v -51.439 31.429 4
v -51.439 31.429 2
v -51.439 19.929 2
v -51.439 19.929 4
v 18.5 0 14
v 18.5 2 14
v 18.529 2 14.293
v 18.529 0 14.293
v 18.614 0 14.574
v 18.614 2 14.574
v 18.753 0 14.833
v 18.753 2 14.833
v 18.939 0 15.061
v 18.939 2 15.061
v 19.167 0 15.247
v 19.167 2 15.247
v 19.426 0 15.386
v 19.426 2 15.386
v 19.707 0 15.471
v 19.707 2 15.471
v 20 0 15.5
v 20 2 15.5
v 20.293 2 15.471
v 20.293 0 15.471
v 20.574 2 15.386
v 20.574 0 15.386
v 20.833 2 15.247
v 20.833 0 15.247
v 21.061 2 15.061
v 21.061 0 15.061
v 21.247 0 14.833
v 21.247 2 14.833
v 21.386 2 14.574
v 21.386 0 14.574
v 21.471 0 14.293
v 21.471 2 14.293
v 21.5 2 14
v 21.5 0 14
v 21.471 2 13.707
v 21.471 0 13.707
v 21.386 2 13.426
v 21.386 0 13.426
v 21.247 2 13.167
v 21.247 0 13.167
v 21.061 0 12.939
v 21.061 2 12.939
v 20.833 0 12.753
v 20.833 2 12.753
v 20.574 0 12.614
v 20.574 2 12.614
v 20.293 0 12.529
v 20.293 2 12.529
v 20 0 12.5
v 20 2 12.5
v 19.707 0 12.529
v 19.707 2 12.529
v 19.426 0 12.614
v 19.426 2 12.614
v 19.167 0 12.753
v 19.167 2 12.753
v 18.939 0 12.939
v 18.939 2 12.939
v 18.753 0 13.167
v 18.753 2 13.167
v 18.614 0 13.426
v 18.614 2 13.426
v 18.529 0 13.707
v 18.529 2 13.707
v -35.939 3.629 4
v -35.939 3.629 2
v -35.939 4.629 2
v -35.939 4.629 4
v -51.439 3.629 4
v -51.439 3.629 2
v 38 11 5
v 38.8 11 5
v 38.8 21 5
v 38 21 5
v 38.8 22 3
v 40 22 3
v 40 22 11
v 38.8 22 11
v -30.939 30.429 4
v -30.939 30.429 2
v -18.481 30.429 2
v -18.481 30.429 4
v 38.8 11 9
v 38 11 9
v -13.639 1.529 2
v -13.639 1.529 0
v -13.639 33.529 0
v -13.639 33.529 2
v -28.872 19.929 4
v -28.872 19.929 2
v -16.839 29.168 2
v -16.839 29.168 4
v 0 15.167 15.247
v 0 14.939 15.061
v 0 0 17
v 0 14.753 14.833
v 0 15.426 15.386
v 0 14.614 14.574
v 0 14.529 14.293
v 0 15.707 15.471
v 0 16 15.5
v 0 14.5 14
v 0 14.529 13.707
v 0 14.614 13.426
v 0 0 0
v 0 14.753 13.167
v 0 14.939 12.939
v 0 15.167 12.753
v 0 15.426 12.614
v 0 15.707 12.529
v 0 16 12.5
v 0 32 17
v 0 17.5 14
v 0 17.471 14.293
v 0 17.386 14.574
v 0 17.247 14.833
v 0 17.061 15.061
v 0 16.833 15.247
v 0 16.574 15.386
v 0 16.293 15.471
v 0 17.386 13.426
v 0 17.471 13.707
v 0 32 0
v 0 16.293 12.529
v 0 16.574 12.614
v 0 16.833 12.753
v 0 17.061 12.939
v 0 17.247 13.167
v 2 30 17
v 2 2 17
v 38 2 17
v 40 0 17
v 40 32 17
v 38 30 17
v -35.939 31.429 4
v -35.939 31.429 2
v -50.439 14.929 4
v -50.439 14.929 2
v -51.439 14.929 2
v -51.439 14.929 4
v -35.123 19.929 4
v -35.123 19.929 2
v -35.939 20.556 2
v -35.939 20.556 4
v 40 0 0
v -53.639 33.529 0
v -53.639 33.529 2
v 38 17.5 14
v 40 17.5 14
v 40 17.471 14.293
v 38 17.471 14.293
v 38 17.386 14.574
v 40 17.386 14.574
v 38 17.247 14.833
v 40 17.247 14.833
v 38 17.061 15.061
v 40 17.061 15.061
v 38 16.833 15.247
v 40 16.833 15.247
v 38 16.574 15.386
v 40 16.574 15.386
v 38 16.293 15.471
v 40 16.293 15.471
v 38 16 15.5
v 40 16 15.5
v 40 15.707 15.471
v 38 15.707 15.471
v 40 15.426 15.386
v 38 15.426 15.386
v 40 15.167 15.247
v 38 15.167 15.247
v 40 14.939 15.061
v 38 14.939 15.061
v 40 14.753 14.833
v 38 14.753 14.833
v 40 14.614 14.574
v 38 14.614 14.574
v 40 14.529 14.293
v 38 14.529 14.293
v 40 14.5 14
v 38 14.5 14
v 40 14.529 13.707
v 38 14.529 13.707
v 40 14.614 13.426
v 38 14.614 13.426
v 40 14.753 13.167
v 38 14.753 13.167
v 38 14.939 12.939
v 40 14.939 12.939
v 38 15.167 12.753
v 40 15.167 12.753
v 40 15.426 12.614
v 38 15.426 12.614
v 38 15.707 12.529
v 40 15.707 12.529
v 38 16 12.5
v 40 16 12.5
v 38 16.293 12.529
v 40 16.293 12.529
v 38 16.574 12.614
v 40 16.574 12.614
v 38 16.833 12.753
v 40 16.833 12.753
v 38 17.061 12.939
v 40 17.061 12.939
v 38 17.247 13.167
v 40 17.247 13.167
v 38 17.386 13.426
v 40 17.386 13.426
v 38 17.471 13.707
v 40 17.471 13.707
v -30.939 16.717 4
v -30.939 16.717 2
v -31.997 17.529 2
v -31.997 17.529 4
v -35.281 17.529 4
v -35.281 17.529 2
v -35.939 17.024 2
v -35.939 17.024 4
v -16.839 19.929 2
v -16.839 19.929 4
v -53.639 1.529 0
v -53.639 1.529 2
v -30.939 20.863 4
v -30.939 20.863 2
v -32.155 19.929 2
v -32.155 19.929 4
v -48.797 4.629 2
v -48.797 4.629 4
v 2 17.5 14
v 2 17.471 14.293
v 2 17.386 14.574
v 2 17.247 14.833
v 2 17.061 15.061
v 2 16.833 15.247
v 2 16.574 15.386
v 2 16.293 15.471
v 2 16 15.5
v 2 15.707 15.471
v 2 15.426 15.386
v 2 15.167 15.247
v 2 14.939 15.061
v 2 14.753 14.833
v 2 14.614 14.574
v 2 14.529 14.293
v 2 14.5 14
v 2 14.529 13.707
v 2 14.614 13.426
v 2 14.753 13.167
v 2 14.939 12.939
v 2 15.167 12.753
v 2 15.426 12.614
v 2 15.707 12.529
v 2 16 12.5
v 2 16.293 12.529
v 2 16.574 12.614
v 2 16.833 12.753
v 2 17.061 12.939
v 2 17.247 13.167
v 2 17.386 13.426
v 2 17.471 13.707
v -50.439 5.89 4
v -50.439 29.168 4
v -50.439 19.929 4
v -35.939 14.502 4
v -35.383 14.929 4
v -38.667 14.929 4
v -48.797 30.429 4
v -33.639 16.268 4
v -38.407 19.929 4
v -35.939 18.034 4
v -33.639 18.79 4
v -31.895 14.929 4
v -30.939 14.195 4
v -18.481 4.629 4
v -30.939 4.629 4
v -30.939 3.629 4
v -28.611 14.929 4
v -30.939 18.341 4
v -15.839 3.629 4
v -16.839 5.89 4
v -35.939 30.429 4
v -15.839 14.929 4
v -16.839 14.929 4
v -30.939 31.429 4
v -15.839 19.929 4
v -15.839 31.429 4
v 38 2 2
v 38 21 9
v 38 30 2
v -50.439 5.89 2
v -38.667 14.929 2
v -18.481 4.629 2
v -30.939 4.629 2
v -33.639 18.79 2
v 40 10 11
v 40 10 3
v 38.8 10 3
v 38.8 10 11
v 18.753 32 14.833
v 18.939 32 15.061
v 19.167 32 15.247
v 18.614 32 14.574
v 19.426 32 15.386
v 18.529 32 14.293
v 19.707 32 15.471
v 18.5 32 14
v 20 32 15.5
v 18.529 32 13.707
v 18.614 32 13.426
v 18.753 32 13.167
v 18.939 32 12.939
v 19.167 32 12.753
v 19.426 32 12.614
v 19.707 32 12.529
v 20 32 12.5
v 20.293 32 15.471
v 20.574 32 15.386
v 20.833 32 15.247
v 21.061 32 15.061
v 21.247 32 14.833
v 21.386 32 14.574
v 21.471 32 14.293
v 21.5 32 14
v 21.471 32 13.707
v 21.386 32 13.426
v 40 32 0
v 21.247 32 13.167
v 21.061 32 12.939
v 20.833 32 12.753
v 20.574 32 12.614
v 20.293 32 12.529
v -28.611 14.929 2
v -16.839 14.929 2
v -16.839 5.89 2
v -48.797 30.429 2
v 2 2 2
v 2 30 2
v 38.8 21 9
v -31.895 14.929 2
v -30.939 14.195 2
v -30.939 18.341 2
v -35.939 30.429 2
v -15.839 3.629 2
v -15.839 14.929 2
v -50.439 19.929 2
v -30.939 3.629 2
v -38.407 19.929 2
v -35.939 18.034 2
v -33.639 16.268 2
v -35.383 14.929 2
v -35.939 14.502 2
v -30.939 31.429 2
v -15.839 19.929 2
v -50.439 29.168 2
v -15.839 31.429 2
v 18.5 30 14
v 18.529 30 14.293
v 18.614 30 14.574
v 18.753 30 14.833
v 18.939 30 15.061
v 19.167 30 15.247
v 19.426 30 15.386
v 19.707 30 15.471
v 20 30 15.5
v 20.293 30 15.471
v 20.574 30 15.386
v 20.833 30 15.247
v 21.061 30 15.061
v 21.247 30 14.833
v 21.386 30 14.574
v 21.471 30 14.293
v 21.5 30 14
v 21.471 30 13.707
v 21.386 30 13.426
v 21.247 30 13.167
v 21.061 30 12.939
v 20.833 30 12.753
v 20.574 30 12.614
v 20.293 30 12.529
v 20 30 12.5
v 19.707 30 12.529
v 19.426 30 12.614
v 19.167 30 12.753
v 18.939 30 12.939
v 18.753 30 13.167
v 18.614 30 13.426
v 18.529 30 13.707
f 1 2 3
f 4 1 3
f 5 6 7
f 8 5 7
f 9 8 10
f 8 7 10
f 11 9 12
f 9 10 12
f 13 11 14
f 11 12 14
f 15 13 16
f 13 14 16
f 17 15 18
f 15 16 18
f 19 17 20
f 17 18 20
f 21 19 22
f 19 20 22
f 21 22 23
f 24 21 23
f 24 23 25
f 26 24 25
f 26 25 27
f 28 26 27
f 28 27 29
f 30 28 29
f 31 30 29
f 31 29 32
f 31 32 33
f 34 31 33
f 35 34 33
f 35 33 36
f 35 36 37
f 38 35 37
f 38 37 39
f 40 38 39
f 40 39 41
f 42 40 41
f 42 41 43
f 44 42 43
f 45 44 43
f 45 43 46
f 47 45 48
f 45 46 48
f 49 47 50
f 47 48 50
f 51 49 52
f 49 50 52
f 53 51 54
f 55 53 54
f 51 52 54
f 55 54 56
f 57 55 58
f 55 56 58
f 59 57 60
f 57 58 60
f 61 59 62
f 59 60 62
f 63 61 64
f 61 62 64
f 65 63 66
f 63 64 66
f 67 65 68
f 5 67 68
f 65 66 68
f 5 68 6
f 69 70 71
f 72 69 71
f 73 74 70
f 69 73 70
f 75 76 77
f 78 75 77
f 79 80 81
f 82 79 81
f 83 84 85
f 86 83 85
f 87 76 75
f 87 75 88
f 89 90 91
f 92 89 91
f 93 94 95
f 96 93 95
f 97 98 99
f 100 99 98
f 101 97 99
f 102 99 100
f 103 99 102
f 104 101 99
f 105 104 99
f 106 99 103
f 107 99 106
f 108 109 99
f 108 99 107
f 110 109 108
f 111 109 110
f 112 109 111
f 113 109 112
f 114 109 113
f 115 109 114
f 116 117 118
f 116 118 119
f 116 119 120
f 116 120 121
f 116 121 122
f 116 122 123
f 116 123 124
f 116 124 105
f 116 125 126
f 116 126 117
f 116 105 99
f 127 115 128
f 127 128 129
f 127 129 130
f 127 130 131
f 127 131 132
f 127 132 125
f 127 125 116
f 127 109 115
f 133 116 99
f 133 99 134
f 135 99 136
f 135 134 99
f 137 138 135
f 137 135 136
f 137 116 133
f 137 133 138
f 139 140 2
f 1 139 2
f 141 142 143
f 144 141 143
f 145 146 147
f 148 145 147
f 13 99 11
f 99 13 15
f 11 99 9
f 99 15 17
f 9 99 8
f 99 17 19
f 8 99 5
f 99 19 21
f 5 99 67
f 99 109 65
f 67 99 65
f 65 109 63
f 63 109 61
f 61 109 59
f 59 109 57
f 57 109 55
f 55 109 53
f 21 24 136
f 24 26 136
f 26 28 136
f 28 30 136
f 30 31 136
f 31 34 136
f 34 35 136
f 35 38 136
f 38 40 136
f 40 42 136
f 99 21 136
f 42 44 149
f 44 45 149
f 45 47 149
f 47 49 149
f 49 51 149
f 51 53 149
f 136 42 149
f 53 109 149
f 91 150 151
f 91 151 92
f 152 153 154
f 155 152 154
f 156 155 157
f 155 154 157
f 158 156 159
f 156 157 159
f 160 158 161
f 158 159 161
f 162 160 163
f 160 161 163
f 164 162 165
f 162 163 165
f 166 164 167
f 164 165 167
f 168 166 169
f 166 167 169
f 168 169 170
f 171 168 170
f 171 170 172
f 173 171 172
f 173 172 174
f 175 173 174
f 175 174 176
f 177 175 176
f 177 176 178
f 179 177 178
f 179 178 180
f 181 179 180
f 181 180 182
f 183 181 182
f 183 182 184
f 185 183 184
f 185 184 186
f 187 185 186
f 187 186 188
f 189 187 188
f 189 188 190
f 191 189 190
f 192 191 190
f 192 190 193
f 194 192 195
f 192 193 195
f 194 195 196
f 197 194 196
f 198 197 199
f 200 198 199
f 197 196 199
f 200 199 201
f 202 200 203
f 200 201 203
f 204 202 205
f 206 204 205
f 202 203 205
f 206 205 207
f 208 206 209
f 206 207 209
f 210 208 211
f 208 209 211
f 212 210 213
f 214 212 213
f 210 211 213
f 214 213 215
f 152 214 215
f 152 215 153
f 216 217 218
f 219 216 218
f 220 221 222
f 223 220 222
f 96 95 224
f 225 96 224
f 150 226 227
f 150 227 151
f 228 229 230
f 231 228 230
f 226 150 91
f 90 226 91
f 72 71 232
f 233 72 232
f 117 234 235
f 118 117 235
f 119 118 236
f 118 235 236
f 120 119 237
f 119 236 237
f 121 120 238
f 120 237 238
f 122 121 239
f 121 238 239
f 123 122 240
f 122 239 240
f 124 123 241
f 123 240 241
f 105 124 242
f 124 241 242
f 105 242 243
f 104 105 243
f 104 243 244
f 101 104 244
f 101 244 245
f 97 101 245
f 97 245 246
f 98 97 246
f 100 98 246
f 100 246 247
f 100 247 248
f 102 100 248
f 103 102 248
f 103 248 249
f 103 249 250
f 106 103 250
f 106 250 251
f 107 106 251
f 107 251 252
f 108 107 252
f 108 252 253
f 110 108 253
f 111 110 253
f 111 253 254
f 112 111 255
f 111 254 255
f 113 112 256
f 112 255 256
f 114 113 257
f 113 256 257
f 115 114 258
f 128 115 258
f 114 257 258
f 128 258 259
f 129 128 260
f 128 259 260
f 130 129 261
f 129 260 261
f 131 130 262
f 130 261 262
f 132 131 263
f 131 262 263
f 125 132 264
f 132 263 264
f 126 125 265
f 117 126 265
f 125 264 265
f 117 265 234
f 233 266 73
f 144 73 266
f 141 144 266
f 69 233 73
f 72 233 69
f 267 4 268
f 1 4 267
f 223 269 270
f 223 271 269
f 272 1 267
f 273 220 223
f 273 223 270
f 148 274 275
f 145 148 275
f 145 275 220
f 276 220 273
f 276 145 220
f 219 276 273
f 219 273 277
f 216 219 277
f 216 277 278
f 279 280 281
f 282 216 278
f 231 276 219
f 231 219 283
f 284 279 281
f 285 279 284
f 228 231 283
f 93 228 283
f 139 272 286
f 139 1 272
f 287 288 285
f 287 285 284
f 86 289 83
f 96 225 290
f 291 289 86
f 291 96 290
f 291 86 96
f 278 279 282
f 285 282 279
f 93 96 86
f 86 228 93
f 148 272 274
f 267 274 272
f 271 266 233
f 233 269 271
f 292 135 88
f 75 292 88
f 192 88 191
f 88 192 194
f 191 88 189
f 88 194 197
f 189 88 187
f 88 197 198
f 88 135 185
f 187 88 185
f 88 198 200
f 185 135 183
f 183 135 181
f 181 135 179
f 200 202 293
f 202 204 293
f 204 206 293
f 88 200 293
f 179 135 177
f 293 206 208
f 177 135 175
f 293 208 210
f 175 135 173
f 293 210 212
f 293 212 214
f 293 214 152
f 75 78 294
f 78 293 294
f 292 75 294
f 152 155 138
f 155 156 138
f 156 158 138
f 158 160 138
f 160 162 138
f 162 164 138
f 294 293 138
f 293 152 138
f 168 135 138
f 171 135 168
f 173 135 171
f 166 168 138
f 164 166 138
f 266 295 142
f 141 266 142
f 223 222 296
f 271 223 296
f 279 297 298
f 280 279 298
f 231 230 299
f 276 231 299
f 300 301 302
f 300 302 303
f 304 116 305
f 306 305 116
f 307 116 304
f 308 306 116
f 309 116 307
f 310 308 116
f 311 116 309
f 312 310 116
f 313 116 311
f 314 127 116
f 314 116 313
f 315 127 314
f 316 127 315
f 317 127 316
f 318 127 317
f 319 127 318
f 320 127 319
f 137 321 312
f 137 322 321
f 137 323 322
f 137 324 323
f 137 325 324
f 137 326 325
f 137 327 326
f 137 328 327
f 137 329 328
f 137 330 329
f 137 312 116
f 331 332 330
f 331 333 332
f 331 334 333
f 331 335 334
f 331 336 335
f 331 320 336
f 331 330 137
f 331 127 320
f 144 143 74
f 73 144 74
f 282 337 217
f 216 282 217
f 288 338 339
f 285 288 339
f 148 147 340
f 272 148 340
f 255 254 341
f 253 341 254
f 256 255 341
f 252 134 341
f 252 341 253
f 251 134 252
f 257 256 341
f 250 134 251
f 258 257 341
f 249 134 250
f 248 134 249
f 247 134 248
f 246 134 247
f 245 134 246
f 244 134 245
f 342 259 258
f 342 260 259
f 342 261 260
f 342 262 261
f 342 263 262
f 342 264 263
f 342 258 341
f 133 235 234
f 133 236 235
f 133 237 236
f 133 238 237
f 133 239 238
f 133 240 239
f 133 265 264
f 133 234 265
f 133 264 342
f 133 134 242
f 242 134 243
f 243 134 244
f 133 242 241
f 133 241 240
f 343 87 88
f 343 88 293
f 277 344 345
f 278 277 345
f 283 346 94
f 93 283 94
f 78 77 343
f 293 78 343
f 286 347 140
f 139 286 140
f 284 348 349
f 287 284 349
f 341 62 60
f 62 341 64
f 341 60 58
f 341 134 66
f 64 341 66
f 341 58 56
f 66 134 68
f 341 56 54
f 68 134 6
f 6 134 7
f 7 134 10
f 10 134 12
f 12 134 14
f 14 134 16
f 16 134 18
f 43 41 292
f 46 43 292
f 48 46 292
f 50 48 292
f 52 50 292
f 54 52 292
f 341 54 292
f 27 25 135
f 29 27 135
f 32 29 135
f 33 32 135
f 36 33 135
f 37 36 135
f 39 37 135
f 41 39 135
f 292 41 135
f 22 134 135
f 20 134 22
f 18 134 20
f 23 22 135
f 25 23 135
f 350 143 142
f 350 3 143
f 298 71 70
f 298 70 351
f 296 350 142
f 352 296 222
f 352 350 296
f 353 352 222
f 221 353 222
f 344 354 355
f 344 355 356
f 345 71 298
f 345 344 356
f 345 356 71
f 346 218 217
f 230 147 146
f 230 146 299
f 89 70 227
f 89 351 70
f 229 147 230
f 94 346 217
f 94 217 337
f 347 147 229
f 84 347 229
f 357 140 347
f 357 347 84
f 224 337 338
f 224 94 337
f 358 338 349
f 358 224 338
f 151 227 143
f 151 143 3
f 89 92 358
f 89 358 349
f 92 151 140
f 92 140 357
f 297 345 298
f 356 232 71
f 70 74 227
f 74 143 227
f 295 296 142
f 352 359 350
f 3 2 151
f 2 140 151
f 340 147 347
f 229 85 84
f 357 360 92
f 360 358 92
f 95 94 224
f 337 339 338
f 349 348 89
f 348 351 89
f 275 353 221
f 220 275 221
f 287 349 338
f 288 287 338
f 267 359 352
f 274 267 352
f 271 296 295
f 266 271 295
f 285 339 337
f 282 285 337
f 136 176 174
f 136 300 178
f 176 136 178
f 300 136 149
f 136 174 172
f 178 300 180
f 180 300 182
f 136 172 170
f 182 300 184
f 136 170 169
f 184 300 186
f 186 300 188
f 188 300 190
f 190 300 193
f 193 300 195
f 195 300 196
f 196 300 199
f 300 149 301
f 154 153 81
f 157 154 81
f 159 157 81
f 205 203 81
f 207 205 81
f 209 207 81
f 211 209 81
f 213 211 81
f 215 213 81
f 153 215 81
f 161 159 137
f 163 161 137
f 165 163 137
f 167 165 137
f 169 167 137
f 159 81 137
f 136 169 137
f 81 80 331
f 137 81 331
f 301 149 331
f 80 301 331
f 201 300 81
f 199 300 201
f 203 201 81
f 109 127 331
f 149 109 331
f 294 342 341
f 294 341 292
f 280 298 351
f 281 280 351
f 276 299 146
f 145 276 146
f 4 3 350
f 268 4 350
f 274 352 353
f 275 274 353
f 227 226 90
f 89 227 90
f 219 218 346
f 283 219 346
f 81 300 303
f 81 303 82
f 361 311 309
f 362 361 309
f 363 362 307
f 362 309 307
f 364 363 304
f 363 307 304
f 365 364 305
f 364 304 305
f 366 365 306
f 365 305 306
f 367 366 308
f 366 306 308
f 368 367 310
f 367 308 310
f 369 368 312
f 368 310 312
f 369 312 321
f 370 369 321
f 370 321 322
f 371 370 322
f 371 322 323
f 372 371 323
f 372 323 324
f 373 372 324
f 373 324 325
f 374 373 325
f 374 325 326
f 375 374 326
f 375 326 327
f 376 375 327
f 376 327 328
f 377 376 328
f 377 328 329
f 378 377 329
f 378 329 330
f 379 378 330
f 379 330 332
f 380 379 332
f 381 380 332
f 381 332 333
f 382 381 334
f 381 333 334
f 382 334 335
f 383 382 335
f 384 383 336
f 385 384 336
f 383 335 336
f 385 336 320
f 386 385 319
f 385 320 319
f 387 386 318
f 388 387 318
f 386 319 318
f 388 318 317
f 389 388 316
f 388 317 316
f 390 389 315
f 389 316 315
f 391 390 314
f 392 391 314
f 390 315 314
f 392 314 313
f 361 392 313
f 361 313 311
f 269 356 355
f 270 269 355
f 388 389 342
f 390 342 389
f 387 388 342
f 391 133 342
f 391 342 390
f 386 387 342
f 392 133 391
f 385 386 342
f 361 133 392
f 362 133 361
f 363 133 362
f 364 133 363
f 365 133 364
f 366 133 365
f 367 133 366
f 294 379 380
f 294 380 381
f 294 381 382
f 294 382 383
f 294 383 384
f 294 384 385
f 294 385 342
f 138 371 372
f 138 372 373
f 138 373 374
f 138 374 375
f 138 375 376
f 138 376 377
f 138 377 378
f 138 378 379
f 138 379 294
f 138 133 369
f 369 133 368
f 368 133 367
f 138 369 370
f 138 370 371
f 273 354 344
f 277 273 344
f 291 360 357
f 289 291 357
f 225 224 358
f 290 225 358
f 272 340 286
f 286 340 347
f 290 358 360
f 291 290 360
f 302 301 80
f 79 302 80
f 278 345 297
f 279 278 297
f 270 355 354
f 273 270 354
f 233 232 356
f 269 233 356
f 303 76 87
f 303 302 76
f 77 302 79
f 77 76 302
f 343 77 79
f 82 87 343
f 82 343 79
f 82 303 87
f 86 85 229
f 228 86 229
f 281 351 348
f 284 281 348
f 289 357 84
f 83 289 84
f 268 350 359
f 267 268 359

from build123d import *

# Parameters (mm, degrees)
F0_W      = 40
F0_H      = 32
F1_DEPTH  = 17
F2_W      = 36
F2_H      = 28
F3_DEPTH  = 15
F4_R      = 1.5
F5_DEPTH  = 40.001
F6_R      = 1.5
F7_DEPTH  = 32.001
F4_W      = 10
F4_H      = 4
F8_DEPTH  = 2
F9_W      = 40
F9_H      = 32
F10_DEPTH = 2
F12_DEPTH = 2
F4_W_2    = 12
F4_H_2    = 8
F13_DEPTH = 1.2


with BuildPart() as f1:
    # F0 (on Top) → F1 (new body)
    with BuildSketch(Plane.XY):
        with Locations((20, 16)):
            Rectangle(F0_W, F0_H)
    extrude(amount=F1_DEPTH)

    # F2 (on face) → F3 (cut)
    with BuildSketch(Plane.XY.offset(17)):
        with Locations((20, 16)):
            Rectangle(F2_W, F2_H)
    extrude(amount=-F3_DEPTH, mode=Mode.SUBTRACT)

    # F4 (on face) → F5 (cut, through all)
    with BuildSketch(Plane.YZ.offset(40)):
        with Locations((16, 14)):
            Circle(F4_R)
    extrude(amount=-F5_DEPTH, mode=Mode.SUBTRACT)

    # F6 (on face) → F7 (cut, through all)
    with BuildSketch(Plane(origin=(0, 32, 0), x_dir=(-1, 0, 0), z_dir=(0, 1, 0))):
        with Locations((-20, 14)):
            Circle(F6_R)
    extrude(amount=-F7_DEPTH, mode=Mode.SUBTRACT)

    # F4 (on face) → F8 (cut, through all)
    with BuildSketch(Plane.YZ.offset(40)):
        with Locations((16, 7)):
            Rectangle(F4_W, F4_H)
    extrude(amount=-F8_DEPTH, mode=Mode.SUBTRACT)

    # F4 (on face) → F13 (cut)
    with BuildSketch(Plane.YZ.offset(40)):
        with Locations((16, 7)):
            Rectangle(F4_W_2, F4_H_2)
        with Locations((16, 7)):
            Rectangle(F4_W, F4_H, mode=Mode.SUBTRACT)
    extrude(amount=-F13_DEPTH, mode=Mode.SUBTRACT)


with BuildPart() as f10:
    # F9 (on Top) → F10 (new body)
    with BuildSketch(Plane.XY):
        with Locations((-33.6390890081, 17.5289876275)):
            Rectangle(F9_W, F9_H)
    extrude(amount=F10_DEPTH)

    # F11 (on face) → F12 (join)
    with BuildSketch(Plane.XY.offset(2)):
        Polygon((-35.9390890081, 31.4289876275), (-51.4390890081, 31.4289876275), (-51.4390890081, 19.9289876275), (-50.4390890081, 19.9289876275), (-50.4390890081, 29.1681924055), (-50.4390890081, 30.4289876275), (-48.7971231376, 30.4289876275), (-35.9390890081, 30.4289876275), align=None)
        Polygon((-15.8390890081, 31.4289876275), (-30.9390890081, 31.4289876275), (-30.9390890081, 30.4289876275), (-18.4810548786, 30.4289876275), (-16.8390890081, 30.4289876275), (-16.8390890081, 29.1681924055), (-16.8390890081, 19.9289876275), (-15.8390890081, 19.9289876275), align=None)
        Polygon((-50.4390890081, 30.4289876275), (-50.4390890081, 29.1681924055), (-38.406636274, 19.9289876275), (-36.7646704035, 19.9289876275), align=None)
        Polygon((-35.9390890081, 20.5558542781), (-48.7971231376, 30.4289876275), (-50.4390890081, 30.4289876275), (-36.7646704035, 19.9289876275), (-35.9390890081, 19.9289876275), align=None)
        Polygon((-32.8181060728, 18.1593852385), (-33.6390890081, 18.7897828495), (-34.4600719434, 18.1593852385), (-33.6390890081, 17.5289876275), align=None)
        Polygon((-31.9971231376, 17.5289876275), (-32.8181060728, 18.1593852385), (-33.6390890081, 17.5289876275), (-32.8181060728, 16.8985900165), align=None)
        Polygon((-34.4600719434, 18.1593852385), (-35.2810548786, 17.5289876275), (-34.4600719434, 16.8985900165), (-33.6390890081, 17.5289876275), align=None)
        Polygon((-33.6390890081, 17.5289876275), (-34.4600719434, 16.8985900165), (-33.6390890081, 16.2681924055), (-32.8181060728, 16.8985900165), align=None)
        Polygon((-30.9390890081, 18.3414066912), (-30.9390890081, 19.6022019132), (-32.8181060728, 18.1593852385), (-31.9971231376, 17.5289876275), align=None)
        Polygon((-30.9390890081, 19.9289876275), (-32.1554734833, 19.9289876275), (-33.6390890081, 18.7897828495), (-32.8181060728, 18.1593852385), (-30.9390890081, 19.6022019132), align=None)
        Polygon((-35.2810548786, 17.5289876275), (-35.9390890081, 17.0237114209), (-35.9390890081, 15.7629161989), (-34.4600719434, 16.8985900165), align=None)
        Polygon((-34.4600719434, 16.8985900165), (-35.9390890081, 15.7629161989), (-35.9390890081, 14.9289876275), (-35.3831696492, 14.9289876275), (-33.6390890081, 16.2681924055), align=None)
        Polygon((-30.9390890081, 14.1949781198), (-18.4810548786, 4.6289876275), (-16.8390890081, 4.6289876275), (-30.2530424965, 14.9289876275), (-30.9390890081, 14.9289876275), align=None)
        Polygon((-16.8390890081, 4.6289876275), (-16.8390890081, 5.8897828495), (-28.611076626, 14.9289876275), (-30.2530424965, 14.9289876275), align=None)
        Polygon((-35.9390890081, 17.0237114209), (-38.6671013903, 14.9289876275), (-37.0251355197, 14.9289876275), (-35.9390890081, 15.7629161989), align=None)
        Polygon((-36.7646704035, 19.9289876275), (-38.406636274, 19.9289876275), (-35.9390890081, 18.034263834), (-35.9390890081, 19.295059056), align=None)
        Polygon((-35.9390890081, 19.295059056), (-35.9390890081, 18.034263834), (-35.2810548786, 17.5289876275), (-34.4600719434, 18.1593852385), align=None)
        Polygon((-33.6390890081, 18.7897828495), (-35.1227045329, 19.9289876275), (-35.9390890081, 19.9289876275), (-35.9390890081, 19.295059056), (-34.4600719434, 18.1593852385), align=None)
        Polygon((-35.1227045329, 19.9289876275), (-35.9390890081, 20.5558542781), (-35.9390890081, 19.9289876275), align=None)
        Polygon((-35.9390890081, 15.7629161989), (-37.0251355197, 14.9289876275), (-35.9390890081, 14.9289876275), align=None)
        Polygon((-32.8181060728, 16.8985900165), (-33.6390890081, 16.2681924055), (-31.895008367, 14.9289876275), (-30.9390890081, 14.9289876275), (-30.9390890081, 15.4557733418), align=None)
        Polygon((-30.9390890081, 16.7165685638), (-31.9971231376, 17.5289876275), (-32.8181060728, 16.8985900165), (-30.9390890081, 15.4557733418), align=None)
        Polygon((-30.2530424965, 14.9289876275), (-28.611076626, 14.9289876275), (-30.9390890081, 16.7165685638), (-30.9390890081, 15.4557733418), align=None)
        Polygon((-30.9390890081, 14.9289876275), (-30.2530424965, 14.9289876275), (-30.9390890081, 15.4557733418), align=None)
        Polygon((-31.895008367, 14.9289876275), (-30.9390890081, 14.1949781198), (-30.9390890081, 14.9289876275), align=None)
        Polygon((-35.9390890081, 19.295059056), (-35.9390890081, 19.9289876275), (-36.7646704035, 19.9289876275), align=None)
        Polygon((-30.9390890081, 18.3414066912), (-28.8715417422, 19.9289876275), (-30.5135076128, 19.9289876275), (-30.9390890081, 19.6022019132), align=None)
        Polygon((-30.5135076128, 19.9289876275), (-30.9390890081, 19.9289876275), (-30.9390890081, 19.6022019132), align=None)
        Polygon((-30.9390890081, 19.9289876275), (-30.9390890081, 20.8629971352), (-32.1554734833, 19.9289876275), align=None)
        Polygon((-16.8390890081, 30.4289876275), (-18.4810548786, 30.4289876275), (-30.9390890081, 20.8629971352), (-30.9390890081, 19.9289876275), (-30.5135076128, 19.9289876275), align=None)
        Polygon((-16.8390890081, 29.1681924055), (-16.8390890081, 30.4289876275), (-30.5135076128, 19.9289876275), (-28.8715417422, 19.9289876275), align=None)
        Polygon((-37.0251355197, 14.9289876275), (-50.4390890081, 4.6289876275), (-48.7971231376, 4.6289876275), (-35.9390890081, 14.5021209769), (-35.9390890081, 14.9289876275), align=None)
        Polygon((-38.6671013903, 14.9289876275), (-50.4390890081, 5.8897828495), (-50.4390890081, 4.6289876275), (-37.0251355197, 14.9289876275), align=None)
        Polygon((-50.4390890081, 14.9289876275), (-51.4390890081, 14.9289876275), (-51.4390890081, 3.6289876275), (-35.9390890081, 3.6289876275), (-35.9390890081, 4.6289876275), (-48.7971231376, 4.6289876275), (-50.4390890081, 4.6289876275), (-50.4390890081, 5.8897828495), align=None)
        Polygon((-15.8390890081, 3.6289876275), (-15.8390890081, 14.9289876275), (-16.8390890081, 14.9289876275), (-16.8390890081, 5.8897828495), (-16.8390890081, 4.6289876275), (-18.4810548786, 4.6289876275), (-30.9390890081, 4.6289876275), (-30.9390890081, 3.6289876275), align=None)
        Polygon((-35.9390890081, 14.9289876275), (-35.9390890081, 14.5021209769), (-35.3831696492, 14.9289876275), align=None)
    extrude(amount=F12_DEPTH)


solid = Compound([f1.part, f10.part])
